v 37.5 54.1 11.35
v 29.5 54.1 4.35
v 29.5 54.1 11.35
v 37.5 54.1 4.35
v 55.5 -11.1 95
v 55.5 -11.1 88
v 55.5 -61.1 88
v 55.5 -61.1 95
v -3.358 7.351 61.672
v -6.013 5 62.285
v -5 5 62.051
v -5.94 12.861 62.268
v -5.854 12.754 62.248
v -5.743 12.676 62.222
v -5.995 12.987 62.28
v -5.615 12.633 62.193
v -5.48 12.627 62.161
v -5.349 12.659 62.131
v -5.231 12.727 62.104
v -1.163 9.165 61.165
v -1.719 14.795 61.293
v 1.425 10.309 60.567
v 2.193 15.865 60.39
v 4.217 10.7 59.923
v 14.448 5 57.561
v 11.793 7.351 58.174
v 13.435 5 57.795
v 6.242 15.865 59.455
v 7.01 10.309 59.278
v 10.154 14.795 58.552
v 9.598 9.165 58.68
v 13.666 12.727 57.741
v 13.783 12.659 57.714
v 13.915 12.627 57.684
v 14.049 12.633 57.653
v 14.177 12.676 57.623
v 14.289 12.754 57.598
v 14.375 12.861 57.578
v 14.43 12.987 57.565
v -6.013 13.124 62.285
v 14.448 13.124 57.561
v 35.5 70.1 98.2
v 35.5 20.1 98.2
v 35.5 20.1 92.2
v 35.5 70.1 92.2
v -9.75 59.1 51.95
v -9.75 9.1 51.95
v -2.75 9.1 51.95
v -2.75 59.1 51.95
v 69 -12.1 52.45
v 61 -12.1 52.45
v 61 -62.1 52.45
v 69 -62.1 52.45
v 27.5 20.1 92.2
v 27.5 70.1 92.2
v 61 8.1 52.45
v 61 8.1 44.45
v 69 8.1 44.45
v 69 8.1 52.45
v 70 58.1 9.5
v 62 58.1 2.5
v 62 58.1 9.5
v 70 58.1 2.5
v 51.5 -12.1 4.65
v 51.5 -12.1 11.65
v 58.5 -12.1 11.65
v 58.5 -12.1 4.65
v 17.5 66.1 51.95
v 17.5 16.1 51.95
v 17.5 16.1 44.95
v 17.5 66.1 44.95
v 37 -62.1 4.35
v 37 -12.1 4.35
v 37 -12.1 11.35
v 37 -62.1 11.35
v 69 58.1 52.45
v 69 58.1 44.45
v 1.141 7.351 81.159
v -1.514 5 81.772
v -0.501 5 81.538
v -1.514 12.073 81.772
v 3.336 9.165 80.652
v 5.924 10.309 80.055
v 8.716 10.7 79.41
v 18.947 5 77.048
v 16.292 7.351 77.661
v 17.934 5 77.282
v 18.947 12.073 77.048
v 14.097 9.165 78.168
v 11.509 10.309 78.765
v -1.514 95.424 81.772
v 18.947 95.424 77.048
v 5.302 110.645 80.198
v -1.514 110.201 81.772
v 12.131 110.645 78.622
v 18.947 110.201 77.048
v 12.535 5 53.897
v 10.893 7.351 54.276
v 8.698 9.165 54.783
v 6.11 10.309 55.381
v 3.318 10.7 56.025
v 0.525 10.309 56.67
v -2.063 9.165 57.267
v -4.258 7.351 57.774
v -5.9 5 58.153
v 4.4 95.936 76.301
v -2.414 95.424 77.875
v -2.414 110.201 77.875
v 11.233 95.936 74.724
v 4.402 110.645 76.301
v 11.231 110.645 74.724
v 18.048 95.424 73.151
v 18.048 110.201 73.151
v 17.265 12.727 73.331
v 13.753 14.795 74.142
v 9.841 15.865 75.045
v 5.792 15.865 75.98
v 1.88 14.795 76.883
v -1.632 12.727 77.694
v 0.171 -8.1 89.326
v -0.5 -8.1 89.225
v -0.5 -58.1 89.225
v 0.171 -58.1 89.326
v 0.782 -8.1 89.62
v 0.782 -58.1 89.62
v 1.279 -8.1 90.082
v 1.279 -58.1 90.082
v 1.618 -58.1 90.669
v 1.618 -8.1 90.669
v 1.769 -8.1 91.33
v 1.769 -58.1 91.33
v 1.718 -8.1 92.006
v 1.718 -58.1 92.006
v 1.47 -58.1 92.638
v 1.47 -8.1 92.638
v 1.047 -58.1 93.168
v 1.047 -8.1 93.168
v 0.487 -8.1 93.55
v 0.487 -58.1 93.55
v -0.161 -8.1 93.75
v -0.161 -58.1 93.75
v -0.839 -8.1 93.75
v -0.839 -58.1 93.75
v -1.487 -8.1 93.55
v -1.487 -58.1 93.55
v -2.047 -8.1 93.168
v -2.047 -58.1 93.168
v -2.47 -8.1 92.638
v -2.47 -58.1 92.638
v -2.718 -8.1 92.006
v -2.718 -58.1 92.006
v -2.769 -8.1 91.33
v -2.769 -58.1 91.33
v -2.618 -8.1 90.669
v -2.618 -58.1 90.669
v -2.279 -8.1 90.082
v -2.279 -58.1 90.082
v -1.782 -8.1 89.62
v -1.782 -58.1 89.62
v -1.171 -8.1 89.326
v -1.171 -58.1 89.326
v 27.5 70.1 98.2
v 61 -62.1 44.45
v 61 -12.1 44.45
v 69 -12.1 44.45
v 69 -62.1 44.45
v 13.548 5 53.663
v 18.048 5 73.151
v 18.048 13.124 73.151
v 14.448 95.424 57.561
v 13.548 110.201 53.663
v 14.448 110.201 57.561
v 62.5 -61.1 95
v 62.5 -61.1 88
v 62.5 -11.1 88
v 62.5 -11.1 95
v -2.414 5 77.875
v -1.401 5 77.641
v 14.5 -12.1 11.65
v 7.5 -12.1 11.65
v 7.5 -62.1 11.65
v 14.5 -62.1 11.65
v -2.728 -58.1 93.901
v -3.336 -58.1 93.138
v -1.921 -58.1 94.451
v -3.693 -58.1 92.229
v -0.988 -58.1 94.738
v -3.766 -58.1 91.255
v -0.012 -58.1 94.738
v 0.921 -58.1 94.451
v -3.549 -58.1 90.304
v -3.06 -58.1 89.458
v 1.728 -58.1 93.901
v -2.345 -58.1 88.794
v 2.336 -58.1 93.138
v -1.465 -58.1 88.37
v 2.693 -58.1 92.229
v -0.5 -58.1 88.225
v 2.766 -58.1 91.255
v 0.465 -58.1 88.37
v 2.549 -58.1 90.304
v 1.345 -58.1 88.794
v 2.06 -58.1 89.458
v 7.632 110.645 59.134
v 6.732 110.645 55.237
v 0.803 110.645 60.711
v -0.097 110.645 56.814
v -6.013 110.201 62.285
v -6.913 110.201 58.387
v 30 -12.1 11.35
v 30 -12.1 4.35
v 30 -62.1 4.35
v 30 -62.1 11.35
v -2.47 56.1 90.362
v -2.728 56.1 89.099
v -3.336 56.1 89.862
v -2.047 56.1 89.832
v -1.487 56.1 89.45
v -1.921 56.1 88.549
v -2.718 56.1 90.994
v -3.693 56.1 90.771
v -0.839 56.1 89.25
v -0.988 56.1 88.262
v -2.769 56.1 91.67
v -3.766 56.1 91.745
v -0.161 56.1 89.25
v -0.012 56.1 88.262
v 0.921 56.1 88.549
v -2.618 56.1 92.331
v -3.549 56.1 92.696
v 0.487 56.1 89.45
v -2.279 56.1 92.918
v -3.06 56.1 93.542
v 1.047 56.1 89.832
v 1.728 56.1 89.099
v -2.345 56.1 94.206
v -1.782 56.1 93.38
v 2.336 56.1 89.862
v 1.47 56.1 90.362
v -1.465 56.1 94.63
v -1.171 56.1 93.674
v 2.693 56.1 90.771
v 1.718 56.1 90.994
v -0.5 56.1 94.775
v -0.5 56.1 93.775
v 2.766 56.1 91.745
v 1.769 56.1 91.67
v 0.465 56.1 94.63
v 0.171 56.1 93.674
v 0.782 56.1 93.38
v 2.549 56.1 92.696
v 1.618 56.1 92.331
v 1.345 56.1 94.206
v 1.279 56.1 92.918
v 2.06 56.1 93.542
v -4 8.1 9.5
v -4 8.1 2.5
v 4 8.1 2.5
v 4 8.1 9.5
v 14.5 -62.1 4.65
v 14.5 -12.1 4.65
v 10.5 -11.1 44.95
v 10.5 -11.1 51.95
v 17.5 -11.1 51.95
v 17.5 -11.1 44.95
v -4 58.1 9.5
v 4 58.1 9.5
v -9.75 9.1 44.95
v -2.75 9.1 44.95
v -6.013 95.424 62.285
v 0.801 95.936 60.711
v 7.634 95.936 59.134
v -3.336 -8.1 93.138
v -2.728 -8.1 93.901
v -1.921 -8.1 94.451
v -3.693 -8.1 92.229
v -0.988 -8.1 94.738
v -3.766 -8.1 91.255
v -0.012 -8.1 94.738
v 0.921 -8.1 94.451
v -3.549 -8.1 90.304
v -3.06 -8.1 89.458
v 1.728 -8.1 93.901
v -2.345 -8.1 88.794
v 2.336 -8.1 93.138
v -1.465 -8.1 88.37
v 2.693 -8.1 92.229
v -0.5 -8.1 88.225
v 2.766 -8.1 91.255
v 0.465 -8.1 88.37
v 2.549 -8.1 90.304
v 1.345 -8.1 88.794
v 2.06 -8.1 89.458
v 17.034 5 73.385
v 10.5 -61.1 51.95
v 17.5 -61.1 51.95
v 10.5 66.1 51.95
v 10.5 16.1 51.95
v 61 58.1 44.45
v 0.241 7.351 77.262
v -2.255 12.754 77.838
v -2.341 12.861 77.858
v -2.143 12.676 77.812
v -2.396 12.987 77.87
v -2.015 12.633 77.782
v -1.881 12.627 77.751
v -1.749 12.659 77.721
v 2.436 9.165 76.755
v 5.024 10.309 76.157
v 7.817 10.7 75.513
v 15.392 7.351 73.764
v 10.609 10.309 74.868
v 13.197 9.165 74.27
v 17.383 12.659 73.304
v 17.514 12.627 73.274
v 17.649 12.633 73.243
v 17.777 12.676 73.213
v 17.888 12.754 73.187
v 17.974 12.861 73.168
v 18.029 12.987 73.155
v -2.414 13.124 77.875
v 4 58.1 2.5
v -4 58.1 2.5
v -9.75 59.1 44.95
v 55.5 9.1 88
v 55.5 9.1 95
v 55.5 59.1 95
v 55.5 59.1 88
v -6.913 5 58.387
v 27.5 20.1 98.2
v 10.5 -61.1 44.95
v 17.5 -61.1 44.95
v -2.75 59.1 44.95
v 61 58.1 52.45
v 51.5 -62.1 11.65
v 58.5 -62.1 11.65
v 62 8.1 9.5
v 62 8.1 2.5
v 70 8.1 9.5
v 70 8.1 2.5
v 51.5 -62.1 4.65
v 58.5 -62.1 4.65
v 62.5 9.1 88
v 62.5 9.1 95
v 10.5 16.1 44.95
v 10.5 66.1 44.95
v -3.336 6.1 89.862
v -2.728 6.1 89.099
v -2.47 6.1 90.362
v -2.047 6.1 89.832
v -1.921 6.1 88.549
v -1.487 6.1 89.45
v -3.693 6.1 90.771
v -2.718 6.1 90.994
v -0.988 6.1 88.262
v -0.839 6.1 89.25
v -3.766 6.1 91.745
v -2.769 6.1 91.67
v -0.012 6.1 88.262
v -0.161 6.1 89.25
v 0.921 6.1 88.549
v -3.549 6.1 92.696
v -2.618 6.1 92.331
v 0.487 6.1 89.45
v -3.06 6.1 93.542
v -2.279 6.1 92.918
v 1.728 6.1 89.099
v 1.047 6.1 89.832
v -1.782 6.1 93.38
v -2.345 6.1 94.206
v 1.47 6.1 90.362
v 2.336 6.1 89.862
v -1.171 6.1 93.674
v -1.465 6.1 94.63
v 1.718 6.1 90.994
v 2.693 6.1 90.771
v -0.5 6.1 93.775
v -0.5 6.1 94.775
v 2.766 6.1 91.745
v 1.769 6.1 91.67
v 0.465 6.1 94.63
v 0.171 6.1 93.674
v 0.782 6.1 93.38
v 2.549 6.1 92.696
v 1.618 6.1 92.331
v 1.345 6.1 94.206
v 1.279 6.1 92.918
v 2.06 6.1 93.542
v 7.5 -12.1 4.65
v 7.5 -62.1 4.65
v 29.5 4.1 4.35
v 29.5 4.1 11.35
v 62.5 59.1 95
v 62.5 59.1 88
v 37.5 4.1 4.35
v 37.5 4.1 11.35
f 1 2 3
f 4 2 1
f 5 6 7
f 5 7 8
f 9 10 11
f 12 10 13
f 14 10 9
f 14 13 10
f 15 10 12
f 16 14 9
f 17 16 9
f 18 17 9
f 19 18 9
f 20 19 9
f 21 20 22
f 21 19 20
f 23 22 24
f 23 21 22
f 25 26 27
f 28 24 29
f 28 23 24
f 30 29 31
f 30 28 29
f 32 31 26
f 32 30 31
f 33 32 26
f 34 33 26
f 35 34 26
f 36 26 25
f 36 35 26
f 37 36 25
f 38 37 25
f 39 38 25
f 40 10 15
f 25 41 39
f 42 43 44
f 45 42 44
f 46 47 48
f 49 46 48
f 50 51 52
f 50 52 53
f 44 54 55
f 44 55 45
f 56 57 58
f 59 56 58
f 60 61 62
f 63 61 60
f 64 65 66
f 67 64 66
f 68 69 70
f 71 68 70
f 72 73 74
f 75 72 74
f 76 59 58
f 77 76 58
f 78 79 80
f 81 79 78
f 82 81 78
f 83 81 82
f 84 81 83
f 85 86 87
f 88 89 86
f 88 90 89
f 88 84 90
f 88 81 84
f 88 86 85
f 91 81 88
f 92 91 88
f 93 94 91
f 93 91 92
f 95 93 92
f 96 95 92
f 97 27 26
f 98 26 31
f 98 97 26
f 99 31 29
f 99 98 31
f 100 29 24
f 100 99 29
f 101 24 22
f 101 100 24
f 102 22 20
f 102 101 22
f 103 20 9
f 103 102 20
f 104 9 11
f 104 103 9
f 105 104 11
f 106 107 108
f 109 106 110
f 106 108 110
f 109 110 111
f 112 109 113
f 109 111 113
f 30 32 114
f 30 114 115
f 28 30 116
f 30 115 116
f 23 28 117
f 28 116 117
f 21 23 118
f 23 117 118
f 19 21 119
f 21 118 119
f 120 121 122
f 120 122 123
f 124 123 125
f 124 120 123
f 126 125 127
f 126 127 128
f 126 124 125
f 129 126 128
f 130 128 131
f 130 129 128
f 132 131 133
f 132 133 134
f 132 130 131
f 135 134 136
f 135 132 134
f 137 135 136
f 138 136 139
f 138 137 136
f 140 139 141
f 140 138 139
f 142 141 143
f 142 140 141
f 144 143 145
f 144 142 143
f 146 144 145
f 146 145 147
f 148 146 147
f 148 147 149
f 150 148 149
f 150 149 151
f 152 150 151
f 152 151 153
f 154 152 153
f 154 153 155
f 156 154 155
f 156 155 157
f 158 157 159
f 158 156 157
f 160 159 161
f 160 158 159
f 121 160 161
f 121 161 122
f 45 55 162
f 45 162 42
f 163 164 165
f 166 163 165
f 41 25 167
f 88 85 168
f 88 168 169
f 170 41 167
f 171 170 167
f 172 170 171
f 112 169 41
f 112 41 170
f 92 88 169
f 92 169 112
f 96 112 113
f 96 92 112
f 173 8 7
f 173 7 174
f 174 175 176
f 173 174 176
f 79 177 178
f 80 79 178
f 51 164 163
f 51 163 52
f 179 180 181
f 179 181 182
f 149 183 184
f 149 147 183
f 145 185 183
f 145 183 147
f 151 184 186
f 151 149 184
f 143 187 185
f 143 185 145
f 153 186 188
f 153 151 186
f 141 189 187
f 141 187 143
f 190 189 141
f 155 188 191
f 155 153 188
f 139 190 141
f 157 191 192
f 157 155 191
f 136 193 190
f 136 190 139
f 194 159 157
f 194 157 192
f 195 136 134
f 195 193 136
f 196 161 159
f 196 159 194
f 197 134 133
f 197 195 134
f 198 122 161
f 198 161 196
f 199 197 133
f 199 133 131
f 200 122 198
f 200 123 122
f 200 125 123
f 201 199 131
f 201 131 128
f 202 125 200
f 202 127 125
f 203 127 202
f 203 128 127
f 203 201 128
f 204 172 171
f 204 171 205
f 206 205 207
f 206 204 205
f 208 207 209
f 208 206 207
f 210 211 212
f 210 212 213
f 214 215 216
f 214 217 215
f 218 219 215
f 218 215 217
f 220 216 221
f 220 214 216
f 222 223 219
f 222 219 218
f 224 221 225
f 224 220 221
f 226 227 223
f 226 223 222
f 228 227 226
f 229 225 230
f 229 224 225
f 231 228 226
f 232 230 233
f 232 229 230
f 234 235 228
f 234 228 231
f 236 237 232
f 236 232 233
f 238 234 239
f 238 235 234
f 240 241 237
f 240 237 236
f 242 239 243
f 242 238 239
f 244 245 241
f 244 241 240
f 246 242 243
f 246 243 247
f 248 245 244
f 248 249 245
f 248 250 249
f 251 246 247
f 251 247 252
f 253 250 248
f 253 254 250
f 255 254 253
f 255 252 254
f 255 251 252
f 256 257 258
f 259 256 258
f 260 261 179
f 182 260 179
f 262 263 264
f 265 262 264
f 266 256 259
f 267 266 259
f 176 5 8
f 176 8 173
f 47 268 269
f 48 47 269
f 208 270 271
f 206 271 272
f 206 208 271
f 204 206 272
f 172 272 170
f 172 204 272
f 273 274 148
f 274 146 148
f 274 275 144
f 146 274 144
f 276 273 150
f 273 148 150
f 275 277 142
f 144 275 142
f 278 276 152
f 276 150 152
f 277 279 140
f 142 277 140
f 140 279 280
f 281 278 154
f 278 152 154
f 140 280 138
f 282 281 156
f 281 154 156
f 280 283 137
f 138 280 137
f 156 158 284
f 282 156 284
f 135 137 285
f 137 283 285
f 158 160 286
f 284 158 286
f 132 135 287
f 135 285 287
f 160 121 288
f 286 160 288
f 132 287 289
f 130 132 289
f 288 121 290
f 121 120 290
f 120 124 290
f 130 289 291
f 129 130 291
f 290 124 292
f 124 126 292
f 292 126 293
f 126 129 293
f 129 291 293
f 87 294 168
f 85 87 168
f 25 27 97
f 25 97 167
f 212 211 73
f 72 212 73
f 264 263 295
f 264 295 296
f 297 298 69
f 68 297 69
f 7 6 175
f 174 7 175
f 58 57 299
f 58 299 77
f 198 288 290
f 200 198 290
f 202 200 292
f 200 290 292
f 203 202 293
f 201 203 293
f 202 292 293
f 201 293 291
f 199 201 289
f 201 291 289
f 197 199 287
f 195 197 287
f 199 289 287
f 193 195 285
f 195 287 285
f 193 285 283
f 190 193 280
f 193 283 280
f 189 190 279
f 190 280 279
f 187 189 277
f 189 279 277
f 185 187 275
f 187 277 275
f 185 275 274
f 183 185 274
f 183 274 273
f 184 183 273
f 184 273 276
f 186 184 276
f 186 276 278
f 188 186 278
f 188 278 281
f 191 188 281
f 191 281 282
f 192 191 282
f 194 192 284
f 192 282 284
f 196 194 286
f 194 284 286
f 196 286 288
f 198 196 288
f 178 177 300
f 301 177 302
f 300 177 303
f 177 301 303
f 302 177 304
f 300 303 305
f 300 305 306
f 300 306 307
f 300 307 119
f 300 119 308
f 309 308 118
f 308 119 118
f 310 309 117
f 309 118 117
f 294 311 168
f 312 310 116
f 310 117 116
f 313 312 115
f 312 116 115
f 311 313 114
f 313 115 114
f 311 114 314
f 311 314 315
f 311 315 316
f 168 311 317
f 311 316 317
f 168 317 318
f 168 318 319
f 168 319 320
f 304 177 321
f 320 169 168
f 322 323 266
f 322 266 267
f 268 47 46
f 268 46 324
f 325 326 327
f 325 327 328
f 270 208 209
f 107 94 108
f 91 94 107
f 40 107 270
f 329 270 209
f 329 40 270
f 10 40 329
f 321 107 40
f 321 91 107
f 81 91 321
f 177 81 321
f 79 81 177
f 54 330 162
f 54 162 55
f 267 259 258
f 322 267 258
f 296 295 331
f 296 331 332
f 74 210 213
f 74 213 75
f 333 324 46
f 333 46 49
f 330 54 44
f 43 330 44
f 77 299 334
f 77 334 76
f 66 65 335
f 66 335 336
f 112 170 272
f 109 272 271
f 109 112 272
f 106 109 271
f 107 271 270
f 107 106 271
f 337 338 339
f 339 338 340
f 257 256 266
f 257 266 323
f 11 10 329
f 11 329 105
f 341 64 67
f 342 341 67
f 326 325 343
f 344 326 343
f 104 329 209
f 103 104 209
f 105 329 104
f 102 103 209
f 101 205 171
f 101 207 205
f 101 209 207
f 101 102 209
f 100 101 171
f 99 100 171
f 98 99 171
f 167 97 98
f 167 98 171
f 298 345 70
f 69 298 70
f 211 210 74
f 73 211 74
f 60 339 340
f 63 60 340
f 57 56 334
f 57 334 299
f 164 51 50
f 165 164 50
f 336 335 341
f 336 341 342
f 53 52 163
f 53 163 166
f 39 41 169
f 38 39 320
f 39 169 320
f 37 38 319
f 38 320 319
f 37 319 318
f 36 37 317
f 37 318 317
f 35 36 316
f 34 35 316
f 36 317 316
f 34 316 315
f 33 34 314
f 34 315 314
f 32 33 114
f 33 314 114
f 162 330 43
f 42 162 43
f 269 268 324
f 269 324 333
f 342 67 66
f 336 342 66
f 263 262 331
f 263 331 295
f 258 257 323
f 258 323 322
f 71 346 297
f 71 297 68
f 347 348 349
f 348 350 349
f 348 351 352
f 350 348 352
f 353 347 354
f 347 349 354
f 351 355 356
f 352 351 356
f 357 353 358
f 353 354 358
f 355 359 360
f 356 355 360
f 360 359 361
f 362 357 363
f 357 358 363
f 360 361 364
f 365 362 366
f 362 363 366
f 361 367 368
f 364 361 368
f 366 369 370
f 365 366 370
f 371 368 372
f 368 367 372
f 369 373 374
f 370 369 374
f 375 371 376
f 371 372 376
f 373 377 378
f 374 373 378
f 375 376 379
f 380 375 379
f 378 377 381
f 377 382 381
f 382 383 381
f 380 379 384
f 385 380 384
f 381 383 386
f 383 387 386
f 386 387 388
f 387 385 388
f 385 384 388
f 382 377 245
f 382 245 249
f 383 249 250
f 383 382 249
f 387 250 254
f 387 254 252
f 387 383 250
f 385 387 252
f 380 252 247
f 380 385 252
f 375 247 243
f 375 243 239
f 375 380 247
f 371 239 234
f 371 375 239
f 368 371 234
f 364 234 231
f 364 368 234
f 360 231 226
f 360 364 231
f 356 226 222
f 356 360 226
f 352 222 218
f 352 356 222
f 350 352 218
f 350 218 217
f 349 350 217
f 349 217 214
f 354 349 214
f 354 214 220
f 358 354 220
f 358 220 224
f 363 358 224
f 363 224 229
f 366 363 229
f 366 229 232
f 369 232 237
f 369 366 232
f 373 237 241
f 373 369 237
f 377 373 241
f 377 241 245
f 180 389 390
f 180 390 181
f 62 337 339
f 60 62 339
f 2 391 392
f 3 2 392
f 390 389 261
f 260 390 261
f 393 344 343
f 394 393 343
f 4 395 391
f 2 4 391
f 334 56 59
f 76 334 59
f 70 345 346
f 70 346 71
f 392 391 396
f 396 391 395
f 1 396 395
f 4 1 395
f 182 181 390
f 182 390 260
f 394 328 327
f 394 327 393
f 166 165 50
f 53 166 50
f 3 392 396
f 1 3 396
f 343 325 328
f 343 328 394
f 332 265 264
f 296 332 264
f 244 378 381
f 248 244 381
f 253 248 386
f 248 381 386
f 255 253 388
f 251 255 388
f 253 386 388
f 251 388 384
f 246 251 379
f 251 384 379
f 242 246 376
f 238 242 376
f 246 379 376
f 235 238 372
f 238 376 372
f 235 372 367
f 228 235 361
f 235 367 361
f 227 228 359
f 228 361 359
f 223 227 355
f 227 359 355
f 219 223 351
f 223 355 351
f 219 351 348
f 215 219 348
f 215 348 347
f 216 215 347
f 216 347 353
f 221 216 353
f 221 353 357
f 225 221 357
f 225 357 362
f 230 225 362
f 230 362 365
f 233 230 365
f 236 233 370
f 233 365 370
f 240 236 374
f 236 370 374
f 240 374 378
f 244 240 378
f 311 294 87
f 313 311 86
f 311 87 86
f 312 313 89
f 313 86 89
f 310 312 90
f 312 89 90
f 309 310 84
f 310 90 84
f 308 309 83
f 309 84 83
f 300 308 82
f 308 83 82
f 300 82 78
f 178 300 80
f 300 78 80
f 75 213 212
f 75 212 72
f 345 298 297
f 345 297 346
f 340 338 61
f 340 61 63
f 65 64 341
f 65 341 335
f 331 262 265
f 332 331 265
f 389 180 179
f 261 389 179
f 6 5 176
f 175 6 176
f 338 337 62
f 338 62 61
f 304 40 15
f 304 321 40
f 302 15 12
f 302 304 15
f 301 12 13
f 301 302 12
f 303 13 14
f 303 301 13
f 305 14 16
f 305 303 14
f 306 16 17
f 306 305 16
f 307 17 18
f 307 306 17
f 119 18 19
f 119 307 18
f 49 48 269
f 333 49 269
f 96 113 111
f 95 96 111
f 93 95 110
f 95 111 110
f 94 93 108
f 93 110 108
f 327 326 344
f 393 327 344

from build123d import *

# Parameters (mm, degrees)
BOSS_EXTRUDE1_START     = 0.1
SKETCH1_W               = 8
SKETCH1_H               = 7
BOSS_EXTRUDE1_DEPTH     = 50
BOSS_EXTRUDE1_2_DEPTH   = 50
BOSS_EXTRUDE2_START     = 0.1
BOSS_EXTRUDE2_DEPTH     = 50
BOSS_EXTRUDE3_START     = 0.1
SKETCH3_W               = 7
SKETCH3_H               = 7
BOSS_EXTRUDE3_DEPTH     = 50
BOSS_EXTRUDE4_START     = 0.1
SKETCH4_W               = 7
SKETCH4_H               = 7
BOSS_EXTRUDE4_DEPTH     = 50
BOSS_EXTRUDE5_START     = 0.1
SKETCH5_W               = 8
SKETCH5_H               = 8
BOSS_EXTRUDE5_DEPTH     = 50
BOSS_EXTRUDE6_START     = 0.1
SKETCH6_W               = 7
SKETCH6_H               = 7
BOSS_EXTRUDE6_DEPTH     = 50
BOSS_EXTRUDE7_START     = 0.1
SKETCH7_W               = 8
SKETCH7_H               = 6
BOSS_EXTRUDE7_DEPTH     = 50
BOSS_EXTRUDE8_START     = 0.1
SKETCH8_R               = 3.275
SKETCH8_R_2             = 2.275
BOSS_EXTRUDE8_DEPTH     = 50
BOSS_EXTRUDE9_START     = 0.1
SKETCH9_W               = 7
SKETCH9_H               = 7
BOSS_EXTRUDE9_DEPTH     = 50
BOSS_EXTRUDE9_2_DEPTH   = 50
BOSS_EXTRUDE9_3_DEPTH   = 50
SKETCH9_W_2             = 8
SKETCH9_H_2             = 8
BOSS_EXTRUDE9_4_DEPTH   = 50
BOSS_EXTRUDE10_START    = 0.1
SKETCH10_W              = 7
SKETCH10_H              = 7
BOSS_EXTRUDE10_DEPTH    = 50
BOSS_EXTRUDE10_2_DEPTH  = 50
BOSS_EXTRUDE11_START    = 0.1
SKETCH11_R              = 3.275
SKETCH11_R_2            = 2.275
BOSS_EXTRUDE11_DEPTH    = 50
SKETCH12_R              = 110.7
SKETCH12_R_2            = 10.7
EXTRUDE_THIN1_DEPTH     = 2
CUT_EXTRUDE1_DEPTH      = 171.917876699
CUT_EXTRUDE1_DEPTH_BACK = 171.917876699
EXTRUDE_THIN2_REACH     = 145.422
SKETCH14_R              = 96
SKETCH14_R_2            = 16
CUT_EXTRUDE2_DEPTH      = 162.371816697
CUT_EXTRUDE2_DEPTH_BACK = 162.371816697
FILLET1_R               = 0.5


with BuildPart() as part:
    # Sketch1 → Boss-Extrude1 (new body)
    with BuildSketch(Plane(origin=(0, 8, 0), x_dir=(1, 0, 0), z_dir=(0, 1, 0)).offset(BOSS_EXTRUDE1_START)):
        with Locations((0, -6)):
            Rectangle(SKETCH1_W, SKETCH1_H)
    extrude(amount=BOSS_EXTRUDE1_DEPTH)


with BuildPart() as body_2:
    # Sketch1 → Boss-Extrude1 2 (new body)
    with BuildSketch(Plane(origin=(0, 8, 0), x_dir=(1, 0, 0), z_dir=(0, 1, 0)).offset(BOSS_EXTRUDE1_START)):
        with Locations((66, -6)):
            Rectangle(SKETCH1_W, SKETCH1_H)
    extrude(amount=BOSS_EXTRUDE1_2_DEPTH)


with BuildPart() as body_3:
    # Sketch2 → Boss-Extrude2 (new body)
    with BuildSketch(Plane(origin=(0, 4, 0), x_dir=(1, 0, 0), z_dir=(0, 1, 0)).offset(BOSS_EXTRUDE2_START)):
        Polygon((37.5, -11.35), (37.5, -4.35), (29.5, -4.35), (29.5, -11.35), (33.75, -11.35), align=None)
    extrude(amount=BOSS_EXTRUDE2_DEPTH)


with BuildPart() as body_4:
    # Sketch3 → Boss-Extrude3 (new body)
    with BuildSketch(Plane(origin=(0, 9, 0), x_dir=(1, 0, 0), z_dir=(0, 1, 0)).offset(BOSS_EXTRUDE3_START)):
        with Locations((-6.25, -48.45)):
            Rectangle(SKETCH3_W, SKETCH3_H)
    extrude(amount=BOSS_EXTRUDE3_DEPTH)


with BuildPart() as body_5:
    # Sketch4 → Boss-Extrude4 (new body)
    with BuildSketch(Plane(origin=(0, 16, 0), x_dir=(1, 0, 0), z_dir=(0, 1, 0)).offset(BOSS_EXTRUDE4_START)):
        with Locations((14, -48.45)):
            Rectangle(SKETCH4_W, SKETCH4_H)
    extrude(amount=BOSS_EXTRUDE4_DEPTH)


with BuildPart() as body_6:
    # Sketch5 → Boss-Extrude5 (new body)
    with BuildSketch(Plane(origin=(0, 8, 0), x_dir=(1, 0, 0), z_dir=(0, 1, 0)).offset(BOSS_EXTRUDE5_START)):
        with Locations((65, -48.45)):
            Rectangle(SKETCH5_W, SKETCH5_H)
    extrude(amount=BOSS_EXTRUDE5_DEPTH)


with BuildPart() as body_7:
    # Sketch6 → Boss-Extrude6 (new body)
    with BuildSketch(Plane(origin=(0, 9, 0), x_dir=(1, 0, 0), z_dir=(0, 1, 0)).offset(BOSS_EXTRUDE6_START)):
        with Locations((59, -91.5)):
            Rectangle(SKETCH6_W, SKETCH6_H)
    extrude(amount=BOSS_EXTRUDE6_DEPTH)


with BuildPart() as body_8:
    # Sketch7 → Boss-Extrude7 (new body)
    with BuildSketch(Plane(origin=(0, 20, 0), x_dir=(1, 0, 0), z_dir=(0, 1, 0)).offset(BOSS_EXTRUDE7_START)):
        with Locations((31.5, -95.2)):
            Rectangle(SKETCH7_W, SKETCH7_H)
    extrude(amount=BOSS_EXTRUDE7_DEPTH)


with BuildPart() as body_9:
    # Sketch8 → Boss-Extrude8 (new body)
    with BuildSketch(Plane(origin=(0, 6, 0), x_dir=(1, 0, 0), z_dir=(0, 1, 0)).offset(BOSS_EXTRUDE8_START)):
        with Locations(Location((-0.5, -91.5, 0), (0, 0, 270))):
            Circle(SKETCH8_R)
        with Locations(Location((-0.5, -91.5, 0), (0, 0, 270))):
            Circle(SKETCH8_R_2, mode=Mode.SUBTRACT)
    extrude(amount=BOSS_EXTRUDE8_DEPTH)


with BuildPart() as body_10:
    # Sketch9 → Boss-Extrude9 (new body)
    with BuildSketch(Plane.XZ.offset(12).offset(BOSS_EXTRUDE9_START)):
        with Locations((11, 8.15)):
            Rectangle(SKETCH9_W, SKETCH9_H)
    extrude(amount=BOSS_EXTRUDE9_DEPTH)


with BuildPart() as body_11:
    # Sketch9 → Boss-Extrude9 2 (new body)
    with BuildSketch(Plane.XZ.offset(12).offset(BOSS_EXTRUDE9_START)):
        with Locations((33.5, 7.85)):
            Rectangle(SKETCH9_W, SKETCH9_H)
    extrude(amount=BOSS_EXTRUDE9_2_DEPTH)


with BuildPart() as body_12:
    # Sketch9 → Boss-Extrude9 3 (new body)
    with BuildSketch(Plane.XZ.offset(12).offset(BOSS_EXTRUDE9_START)):
        with Locations((55, 8.15)):
            Rectangle(SKETCH9_W, SKETCH9_H)
    extrude(amount=BOSS_EXTRUDE9_3_DEPTH)


with BuildPart() as body_13:
    # Sketch9 → Boss-Extrude9 4 (new body)
    with BuildSketch(Plane.XZ.offset(12).offset(BOSS_EXTRUDE9_START)):
        with Locations((65, 48.45)):
            Rectangle(SKETCH9_W_2, SKETCH9_H_2)
    extrude(amount=BOSS_EXTRUDE9_4_DEPTH)


with BuildPart() as body_14:
    # Sketch10 → Boss-Extrude10 (new body)
    with BuildSketch(Plane.XZ.offset(11).offset(BOSS_EXTRUDE10_START)):
        with Locations((59, 91.5)):
            Rectangle(SKETCH10_W, SKETCH10_H)
    extrude(amount=BOSS_EXTRUDE10_DEPTH)


with BuildPart() as body_15:
    # Sketch10 → Boss-Extrude10 2 (new body)
    with BuildSketch(Plane.XZ.offset(11).offset(BOSS_EXTRUDE10_START)):
        with Locations((14, 48.45)):
            Rectangle(SKETCH10_W, SKETCH10_H)
    extrude(amount=BOSS_EXTRUDE10_2_DEPTH)


with BuildPart() as body_16:
    # Sketch11 → Boss-Extrude11 (new body)
    with BuildSketch(Plane.XZ.offset(8).offset(BOSS_EXTRUDE11_START)):
        with Locations(Location((-0.5, 91.5, 0), (0, 0, 270))):
            Circle(SKETCH11_R)
        with Locations(Location((-0.5, 91.5, 0), (0, 0, 270))):
            Circle(SKETCH11_R_2, mode=Mode.SUBTRACT)
    extrude(amount=BOSS_EXTRUDE11_DEPTH)


with BuildPart() as body_17:
    # Sketch12 → Extrude-Thin1 (new, symmetric)
    with BuildSketch(Plane(origin=(12.897697924, 0, 55.866067389), x_dir=(0.9743700647852346, 0, -0.224951054343868), z_dir=(0.224951054343868, -1.1551564284111033e-15, 0.9743700647852346))):
        with Locations((-9.370350163, 0)):
            Circle(SKETCH12_R)
        with Locations((-9.370350163, 0)):
            Circle(SKETCH12_R_2, mode=Mode.SUBTRACT)
    extrude(amount=EXTRUDE_THIN1_DEPTH, both=True)

    # Sketch13 → Cut-Extrude1 (cut, two sides: drawn at the far end of the back side and taken through both)
    with BuildSketch(Plane(origin=(13.347600032, 0, 57.814807519), x_dir=(0.9743700647852346, 0, -0.224951054343868), z_dir=(0.224951054343868, -1.1551564284111033e-15, 0.9743700647852346)).offset(-CUT_EXTRUDE1_DEPTH_BACK)):
        with BuildLine():
            Line((0.08956527, 5), (1.129649837, 5))
            Line((1.129649837, 5), (1.129649837, 110.200907437))
            ThreePointArc((1.129649837, 110.200907437), (-9.370350163, -110.7), (-19.870350163, 110.200907437))
            Line((-19.870350163, 110.200907437), (-19.870350163, 5))
            Line((-19.870350163, 5), (-18.830265596, 5))
            ThreePointArc((-18.830265596, 5), (-9.370350163, 10.7), (0.08956527, 5))
        make_face()
    extrude(amount=CUT_EXTRUDE1_DEPTH + CUT_EXTRUDE1_DEPTH_BACK, mode=Mode.SUBTRACT)


with BuildPart() as body_18:
    # Mirror1: mirrored copy
    add(body_17.part.mirror(Plane(origin=(15.147208467, 0, 65.609768037), x_dir=(0.9743700647852344, 0, -0.22495105434386872), z_dir=(0.22495105434386872, 0, 0.9743700647852345))))


with BuildPart() as body_17_1:
    add(body_17.part)

    # Extrude-Thin2: up to this face of the body (flat: up to its plane)
    extrude_thin2_end = Plane(body_17_1.part.faces().sort_by_distance((3.31760712, 59.578942419, 56.025197409))[0])
    # Sketch14 → Extrude-Thin2 (add, up to the picked face)
    with BuildSketch(Plane(origin=(17.846621119, 0, 77.302208815), x_dir=(0.9743700647852342, 0, -0.2249510543438694), z_dir=(0.22495105434386936, 0, 0.9743700647852341)), mode=Mode.PRIVATE) as extrude_thin2_sk1:
        with Locations((-9.370350163, 0)):
            Circle(SKETCH14_R)
        with Locations((-9.370350163, 0)):
            Circle(SKETCH14_R_2, mode=Mode.SUBTRACT)
    extrude_thin2_tool1 = split(extrude(extrude_thin2_sk1.sketch, amount=-EXTRUDE_THIN2_REACH, mode=Mode.PRIVATE), bisect_by=extrude_thin2_end, keep=Keep.BOTH, mode=Mode.PRIVATE)

    add(body_18.part)  # Extrude-Thin2 merges body 18
    add(extrude_thin2_tool1.solids().sort_by(Axis((-82.177396, 0, 100.394573), (-0.22495105434386936, 0, -0.9743700647852341)))[0])

    # Sketch13<3> → Cut-Extrude2 (cut, two sides: drawn at the far end of the back side and taken through both)
    with BuildSketch(Plane(origin=(13.347600032, 0, 57.814807519), x_dir=(0.9743700647852346, 0, -0.224951054343868), z_dir=(0.224951054343868, -1.1551564284111033e-15, 0.9743700647852346)).offset(-CUT_EXTRUDE2_DEPTH_BACK)):
        with BuildLine():
            Line((0.08956527, 5), (1.129649837, 5))
            Line((1.129649837, 5), (1.129649837, 110.200907437))
            ThreePointArc((1.129649837, 110.200907437), (-9.370350163, -110.7), (-19.870350163, 110.200907437))
            Line((-19.870350163, 110.200907437), (-19.870350163, 5))
            Line((-19.870350163, 5), (-18.830265596, 5))
            ThreePointArc((-18.830265596, 5), (-9.370350163, 10.7), (0.08956527, 5))
        make_face()
    extrude(amount=CUT_EXTRUDE2_DEPTH + CUT_EXTRUDE2_DEPTH_BACK, mode=Mode.SUBTRACT)

    # Fillet1
    fillet1_edges = [body_17_1.edges().sort_by_distance(p)[0] for p in [
        (16.247905452, 12.072696468, 65.355652115),
        (-4.213865908, 12.072696468, 70.079624257),
    ]]
    fillet(fillet1_edges, radius=FILLET1_R)


solid = Compound([part.part, body_2.part, body_3.part, body_4.part, body_5.part, body_6.part, body_7.part, body_8.part, body_9.part, body_10.part, body_11.part, body_12.part, body_13.part, body_14.part, body_15.part, body_16.part, body_17_1.part])
